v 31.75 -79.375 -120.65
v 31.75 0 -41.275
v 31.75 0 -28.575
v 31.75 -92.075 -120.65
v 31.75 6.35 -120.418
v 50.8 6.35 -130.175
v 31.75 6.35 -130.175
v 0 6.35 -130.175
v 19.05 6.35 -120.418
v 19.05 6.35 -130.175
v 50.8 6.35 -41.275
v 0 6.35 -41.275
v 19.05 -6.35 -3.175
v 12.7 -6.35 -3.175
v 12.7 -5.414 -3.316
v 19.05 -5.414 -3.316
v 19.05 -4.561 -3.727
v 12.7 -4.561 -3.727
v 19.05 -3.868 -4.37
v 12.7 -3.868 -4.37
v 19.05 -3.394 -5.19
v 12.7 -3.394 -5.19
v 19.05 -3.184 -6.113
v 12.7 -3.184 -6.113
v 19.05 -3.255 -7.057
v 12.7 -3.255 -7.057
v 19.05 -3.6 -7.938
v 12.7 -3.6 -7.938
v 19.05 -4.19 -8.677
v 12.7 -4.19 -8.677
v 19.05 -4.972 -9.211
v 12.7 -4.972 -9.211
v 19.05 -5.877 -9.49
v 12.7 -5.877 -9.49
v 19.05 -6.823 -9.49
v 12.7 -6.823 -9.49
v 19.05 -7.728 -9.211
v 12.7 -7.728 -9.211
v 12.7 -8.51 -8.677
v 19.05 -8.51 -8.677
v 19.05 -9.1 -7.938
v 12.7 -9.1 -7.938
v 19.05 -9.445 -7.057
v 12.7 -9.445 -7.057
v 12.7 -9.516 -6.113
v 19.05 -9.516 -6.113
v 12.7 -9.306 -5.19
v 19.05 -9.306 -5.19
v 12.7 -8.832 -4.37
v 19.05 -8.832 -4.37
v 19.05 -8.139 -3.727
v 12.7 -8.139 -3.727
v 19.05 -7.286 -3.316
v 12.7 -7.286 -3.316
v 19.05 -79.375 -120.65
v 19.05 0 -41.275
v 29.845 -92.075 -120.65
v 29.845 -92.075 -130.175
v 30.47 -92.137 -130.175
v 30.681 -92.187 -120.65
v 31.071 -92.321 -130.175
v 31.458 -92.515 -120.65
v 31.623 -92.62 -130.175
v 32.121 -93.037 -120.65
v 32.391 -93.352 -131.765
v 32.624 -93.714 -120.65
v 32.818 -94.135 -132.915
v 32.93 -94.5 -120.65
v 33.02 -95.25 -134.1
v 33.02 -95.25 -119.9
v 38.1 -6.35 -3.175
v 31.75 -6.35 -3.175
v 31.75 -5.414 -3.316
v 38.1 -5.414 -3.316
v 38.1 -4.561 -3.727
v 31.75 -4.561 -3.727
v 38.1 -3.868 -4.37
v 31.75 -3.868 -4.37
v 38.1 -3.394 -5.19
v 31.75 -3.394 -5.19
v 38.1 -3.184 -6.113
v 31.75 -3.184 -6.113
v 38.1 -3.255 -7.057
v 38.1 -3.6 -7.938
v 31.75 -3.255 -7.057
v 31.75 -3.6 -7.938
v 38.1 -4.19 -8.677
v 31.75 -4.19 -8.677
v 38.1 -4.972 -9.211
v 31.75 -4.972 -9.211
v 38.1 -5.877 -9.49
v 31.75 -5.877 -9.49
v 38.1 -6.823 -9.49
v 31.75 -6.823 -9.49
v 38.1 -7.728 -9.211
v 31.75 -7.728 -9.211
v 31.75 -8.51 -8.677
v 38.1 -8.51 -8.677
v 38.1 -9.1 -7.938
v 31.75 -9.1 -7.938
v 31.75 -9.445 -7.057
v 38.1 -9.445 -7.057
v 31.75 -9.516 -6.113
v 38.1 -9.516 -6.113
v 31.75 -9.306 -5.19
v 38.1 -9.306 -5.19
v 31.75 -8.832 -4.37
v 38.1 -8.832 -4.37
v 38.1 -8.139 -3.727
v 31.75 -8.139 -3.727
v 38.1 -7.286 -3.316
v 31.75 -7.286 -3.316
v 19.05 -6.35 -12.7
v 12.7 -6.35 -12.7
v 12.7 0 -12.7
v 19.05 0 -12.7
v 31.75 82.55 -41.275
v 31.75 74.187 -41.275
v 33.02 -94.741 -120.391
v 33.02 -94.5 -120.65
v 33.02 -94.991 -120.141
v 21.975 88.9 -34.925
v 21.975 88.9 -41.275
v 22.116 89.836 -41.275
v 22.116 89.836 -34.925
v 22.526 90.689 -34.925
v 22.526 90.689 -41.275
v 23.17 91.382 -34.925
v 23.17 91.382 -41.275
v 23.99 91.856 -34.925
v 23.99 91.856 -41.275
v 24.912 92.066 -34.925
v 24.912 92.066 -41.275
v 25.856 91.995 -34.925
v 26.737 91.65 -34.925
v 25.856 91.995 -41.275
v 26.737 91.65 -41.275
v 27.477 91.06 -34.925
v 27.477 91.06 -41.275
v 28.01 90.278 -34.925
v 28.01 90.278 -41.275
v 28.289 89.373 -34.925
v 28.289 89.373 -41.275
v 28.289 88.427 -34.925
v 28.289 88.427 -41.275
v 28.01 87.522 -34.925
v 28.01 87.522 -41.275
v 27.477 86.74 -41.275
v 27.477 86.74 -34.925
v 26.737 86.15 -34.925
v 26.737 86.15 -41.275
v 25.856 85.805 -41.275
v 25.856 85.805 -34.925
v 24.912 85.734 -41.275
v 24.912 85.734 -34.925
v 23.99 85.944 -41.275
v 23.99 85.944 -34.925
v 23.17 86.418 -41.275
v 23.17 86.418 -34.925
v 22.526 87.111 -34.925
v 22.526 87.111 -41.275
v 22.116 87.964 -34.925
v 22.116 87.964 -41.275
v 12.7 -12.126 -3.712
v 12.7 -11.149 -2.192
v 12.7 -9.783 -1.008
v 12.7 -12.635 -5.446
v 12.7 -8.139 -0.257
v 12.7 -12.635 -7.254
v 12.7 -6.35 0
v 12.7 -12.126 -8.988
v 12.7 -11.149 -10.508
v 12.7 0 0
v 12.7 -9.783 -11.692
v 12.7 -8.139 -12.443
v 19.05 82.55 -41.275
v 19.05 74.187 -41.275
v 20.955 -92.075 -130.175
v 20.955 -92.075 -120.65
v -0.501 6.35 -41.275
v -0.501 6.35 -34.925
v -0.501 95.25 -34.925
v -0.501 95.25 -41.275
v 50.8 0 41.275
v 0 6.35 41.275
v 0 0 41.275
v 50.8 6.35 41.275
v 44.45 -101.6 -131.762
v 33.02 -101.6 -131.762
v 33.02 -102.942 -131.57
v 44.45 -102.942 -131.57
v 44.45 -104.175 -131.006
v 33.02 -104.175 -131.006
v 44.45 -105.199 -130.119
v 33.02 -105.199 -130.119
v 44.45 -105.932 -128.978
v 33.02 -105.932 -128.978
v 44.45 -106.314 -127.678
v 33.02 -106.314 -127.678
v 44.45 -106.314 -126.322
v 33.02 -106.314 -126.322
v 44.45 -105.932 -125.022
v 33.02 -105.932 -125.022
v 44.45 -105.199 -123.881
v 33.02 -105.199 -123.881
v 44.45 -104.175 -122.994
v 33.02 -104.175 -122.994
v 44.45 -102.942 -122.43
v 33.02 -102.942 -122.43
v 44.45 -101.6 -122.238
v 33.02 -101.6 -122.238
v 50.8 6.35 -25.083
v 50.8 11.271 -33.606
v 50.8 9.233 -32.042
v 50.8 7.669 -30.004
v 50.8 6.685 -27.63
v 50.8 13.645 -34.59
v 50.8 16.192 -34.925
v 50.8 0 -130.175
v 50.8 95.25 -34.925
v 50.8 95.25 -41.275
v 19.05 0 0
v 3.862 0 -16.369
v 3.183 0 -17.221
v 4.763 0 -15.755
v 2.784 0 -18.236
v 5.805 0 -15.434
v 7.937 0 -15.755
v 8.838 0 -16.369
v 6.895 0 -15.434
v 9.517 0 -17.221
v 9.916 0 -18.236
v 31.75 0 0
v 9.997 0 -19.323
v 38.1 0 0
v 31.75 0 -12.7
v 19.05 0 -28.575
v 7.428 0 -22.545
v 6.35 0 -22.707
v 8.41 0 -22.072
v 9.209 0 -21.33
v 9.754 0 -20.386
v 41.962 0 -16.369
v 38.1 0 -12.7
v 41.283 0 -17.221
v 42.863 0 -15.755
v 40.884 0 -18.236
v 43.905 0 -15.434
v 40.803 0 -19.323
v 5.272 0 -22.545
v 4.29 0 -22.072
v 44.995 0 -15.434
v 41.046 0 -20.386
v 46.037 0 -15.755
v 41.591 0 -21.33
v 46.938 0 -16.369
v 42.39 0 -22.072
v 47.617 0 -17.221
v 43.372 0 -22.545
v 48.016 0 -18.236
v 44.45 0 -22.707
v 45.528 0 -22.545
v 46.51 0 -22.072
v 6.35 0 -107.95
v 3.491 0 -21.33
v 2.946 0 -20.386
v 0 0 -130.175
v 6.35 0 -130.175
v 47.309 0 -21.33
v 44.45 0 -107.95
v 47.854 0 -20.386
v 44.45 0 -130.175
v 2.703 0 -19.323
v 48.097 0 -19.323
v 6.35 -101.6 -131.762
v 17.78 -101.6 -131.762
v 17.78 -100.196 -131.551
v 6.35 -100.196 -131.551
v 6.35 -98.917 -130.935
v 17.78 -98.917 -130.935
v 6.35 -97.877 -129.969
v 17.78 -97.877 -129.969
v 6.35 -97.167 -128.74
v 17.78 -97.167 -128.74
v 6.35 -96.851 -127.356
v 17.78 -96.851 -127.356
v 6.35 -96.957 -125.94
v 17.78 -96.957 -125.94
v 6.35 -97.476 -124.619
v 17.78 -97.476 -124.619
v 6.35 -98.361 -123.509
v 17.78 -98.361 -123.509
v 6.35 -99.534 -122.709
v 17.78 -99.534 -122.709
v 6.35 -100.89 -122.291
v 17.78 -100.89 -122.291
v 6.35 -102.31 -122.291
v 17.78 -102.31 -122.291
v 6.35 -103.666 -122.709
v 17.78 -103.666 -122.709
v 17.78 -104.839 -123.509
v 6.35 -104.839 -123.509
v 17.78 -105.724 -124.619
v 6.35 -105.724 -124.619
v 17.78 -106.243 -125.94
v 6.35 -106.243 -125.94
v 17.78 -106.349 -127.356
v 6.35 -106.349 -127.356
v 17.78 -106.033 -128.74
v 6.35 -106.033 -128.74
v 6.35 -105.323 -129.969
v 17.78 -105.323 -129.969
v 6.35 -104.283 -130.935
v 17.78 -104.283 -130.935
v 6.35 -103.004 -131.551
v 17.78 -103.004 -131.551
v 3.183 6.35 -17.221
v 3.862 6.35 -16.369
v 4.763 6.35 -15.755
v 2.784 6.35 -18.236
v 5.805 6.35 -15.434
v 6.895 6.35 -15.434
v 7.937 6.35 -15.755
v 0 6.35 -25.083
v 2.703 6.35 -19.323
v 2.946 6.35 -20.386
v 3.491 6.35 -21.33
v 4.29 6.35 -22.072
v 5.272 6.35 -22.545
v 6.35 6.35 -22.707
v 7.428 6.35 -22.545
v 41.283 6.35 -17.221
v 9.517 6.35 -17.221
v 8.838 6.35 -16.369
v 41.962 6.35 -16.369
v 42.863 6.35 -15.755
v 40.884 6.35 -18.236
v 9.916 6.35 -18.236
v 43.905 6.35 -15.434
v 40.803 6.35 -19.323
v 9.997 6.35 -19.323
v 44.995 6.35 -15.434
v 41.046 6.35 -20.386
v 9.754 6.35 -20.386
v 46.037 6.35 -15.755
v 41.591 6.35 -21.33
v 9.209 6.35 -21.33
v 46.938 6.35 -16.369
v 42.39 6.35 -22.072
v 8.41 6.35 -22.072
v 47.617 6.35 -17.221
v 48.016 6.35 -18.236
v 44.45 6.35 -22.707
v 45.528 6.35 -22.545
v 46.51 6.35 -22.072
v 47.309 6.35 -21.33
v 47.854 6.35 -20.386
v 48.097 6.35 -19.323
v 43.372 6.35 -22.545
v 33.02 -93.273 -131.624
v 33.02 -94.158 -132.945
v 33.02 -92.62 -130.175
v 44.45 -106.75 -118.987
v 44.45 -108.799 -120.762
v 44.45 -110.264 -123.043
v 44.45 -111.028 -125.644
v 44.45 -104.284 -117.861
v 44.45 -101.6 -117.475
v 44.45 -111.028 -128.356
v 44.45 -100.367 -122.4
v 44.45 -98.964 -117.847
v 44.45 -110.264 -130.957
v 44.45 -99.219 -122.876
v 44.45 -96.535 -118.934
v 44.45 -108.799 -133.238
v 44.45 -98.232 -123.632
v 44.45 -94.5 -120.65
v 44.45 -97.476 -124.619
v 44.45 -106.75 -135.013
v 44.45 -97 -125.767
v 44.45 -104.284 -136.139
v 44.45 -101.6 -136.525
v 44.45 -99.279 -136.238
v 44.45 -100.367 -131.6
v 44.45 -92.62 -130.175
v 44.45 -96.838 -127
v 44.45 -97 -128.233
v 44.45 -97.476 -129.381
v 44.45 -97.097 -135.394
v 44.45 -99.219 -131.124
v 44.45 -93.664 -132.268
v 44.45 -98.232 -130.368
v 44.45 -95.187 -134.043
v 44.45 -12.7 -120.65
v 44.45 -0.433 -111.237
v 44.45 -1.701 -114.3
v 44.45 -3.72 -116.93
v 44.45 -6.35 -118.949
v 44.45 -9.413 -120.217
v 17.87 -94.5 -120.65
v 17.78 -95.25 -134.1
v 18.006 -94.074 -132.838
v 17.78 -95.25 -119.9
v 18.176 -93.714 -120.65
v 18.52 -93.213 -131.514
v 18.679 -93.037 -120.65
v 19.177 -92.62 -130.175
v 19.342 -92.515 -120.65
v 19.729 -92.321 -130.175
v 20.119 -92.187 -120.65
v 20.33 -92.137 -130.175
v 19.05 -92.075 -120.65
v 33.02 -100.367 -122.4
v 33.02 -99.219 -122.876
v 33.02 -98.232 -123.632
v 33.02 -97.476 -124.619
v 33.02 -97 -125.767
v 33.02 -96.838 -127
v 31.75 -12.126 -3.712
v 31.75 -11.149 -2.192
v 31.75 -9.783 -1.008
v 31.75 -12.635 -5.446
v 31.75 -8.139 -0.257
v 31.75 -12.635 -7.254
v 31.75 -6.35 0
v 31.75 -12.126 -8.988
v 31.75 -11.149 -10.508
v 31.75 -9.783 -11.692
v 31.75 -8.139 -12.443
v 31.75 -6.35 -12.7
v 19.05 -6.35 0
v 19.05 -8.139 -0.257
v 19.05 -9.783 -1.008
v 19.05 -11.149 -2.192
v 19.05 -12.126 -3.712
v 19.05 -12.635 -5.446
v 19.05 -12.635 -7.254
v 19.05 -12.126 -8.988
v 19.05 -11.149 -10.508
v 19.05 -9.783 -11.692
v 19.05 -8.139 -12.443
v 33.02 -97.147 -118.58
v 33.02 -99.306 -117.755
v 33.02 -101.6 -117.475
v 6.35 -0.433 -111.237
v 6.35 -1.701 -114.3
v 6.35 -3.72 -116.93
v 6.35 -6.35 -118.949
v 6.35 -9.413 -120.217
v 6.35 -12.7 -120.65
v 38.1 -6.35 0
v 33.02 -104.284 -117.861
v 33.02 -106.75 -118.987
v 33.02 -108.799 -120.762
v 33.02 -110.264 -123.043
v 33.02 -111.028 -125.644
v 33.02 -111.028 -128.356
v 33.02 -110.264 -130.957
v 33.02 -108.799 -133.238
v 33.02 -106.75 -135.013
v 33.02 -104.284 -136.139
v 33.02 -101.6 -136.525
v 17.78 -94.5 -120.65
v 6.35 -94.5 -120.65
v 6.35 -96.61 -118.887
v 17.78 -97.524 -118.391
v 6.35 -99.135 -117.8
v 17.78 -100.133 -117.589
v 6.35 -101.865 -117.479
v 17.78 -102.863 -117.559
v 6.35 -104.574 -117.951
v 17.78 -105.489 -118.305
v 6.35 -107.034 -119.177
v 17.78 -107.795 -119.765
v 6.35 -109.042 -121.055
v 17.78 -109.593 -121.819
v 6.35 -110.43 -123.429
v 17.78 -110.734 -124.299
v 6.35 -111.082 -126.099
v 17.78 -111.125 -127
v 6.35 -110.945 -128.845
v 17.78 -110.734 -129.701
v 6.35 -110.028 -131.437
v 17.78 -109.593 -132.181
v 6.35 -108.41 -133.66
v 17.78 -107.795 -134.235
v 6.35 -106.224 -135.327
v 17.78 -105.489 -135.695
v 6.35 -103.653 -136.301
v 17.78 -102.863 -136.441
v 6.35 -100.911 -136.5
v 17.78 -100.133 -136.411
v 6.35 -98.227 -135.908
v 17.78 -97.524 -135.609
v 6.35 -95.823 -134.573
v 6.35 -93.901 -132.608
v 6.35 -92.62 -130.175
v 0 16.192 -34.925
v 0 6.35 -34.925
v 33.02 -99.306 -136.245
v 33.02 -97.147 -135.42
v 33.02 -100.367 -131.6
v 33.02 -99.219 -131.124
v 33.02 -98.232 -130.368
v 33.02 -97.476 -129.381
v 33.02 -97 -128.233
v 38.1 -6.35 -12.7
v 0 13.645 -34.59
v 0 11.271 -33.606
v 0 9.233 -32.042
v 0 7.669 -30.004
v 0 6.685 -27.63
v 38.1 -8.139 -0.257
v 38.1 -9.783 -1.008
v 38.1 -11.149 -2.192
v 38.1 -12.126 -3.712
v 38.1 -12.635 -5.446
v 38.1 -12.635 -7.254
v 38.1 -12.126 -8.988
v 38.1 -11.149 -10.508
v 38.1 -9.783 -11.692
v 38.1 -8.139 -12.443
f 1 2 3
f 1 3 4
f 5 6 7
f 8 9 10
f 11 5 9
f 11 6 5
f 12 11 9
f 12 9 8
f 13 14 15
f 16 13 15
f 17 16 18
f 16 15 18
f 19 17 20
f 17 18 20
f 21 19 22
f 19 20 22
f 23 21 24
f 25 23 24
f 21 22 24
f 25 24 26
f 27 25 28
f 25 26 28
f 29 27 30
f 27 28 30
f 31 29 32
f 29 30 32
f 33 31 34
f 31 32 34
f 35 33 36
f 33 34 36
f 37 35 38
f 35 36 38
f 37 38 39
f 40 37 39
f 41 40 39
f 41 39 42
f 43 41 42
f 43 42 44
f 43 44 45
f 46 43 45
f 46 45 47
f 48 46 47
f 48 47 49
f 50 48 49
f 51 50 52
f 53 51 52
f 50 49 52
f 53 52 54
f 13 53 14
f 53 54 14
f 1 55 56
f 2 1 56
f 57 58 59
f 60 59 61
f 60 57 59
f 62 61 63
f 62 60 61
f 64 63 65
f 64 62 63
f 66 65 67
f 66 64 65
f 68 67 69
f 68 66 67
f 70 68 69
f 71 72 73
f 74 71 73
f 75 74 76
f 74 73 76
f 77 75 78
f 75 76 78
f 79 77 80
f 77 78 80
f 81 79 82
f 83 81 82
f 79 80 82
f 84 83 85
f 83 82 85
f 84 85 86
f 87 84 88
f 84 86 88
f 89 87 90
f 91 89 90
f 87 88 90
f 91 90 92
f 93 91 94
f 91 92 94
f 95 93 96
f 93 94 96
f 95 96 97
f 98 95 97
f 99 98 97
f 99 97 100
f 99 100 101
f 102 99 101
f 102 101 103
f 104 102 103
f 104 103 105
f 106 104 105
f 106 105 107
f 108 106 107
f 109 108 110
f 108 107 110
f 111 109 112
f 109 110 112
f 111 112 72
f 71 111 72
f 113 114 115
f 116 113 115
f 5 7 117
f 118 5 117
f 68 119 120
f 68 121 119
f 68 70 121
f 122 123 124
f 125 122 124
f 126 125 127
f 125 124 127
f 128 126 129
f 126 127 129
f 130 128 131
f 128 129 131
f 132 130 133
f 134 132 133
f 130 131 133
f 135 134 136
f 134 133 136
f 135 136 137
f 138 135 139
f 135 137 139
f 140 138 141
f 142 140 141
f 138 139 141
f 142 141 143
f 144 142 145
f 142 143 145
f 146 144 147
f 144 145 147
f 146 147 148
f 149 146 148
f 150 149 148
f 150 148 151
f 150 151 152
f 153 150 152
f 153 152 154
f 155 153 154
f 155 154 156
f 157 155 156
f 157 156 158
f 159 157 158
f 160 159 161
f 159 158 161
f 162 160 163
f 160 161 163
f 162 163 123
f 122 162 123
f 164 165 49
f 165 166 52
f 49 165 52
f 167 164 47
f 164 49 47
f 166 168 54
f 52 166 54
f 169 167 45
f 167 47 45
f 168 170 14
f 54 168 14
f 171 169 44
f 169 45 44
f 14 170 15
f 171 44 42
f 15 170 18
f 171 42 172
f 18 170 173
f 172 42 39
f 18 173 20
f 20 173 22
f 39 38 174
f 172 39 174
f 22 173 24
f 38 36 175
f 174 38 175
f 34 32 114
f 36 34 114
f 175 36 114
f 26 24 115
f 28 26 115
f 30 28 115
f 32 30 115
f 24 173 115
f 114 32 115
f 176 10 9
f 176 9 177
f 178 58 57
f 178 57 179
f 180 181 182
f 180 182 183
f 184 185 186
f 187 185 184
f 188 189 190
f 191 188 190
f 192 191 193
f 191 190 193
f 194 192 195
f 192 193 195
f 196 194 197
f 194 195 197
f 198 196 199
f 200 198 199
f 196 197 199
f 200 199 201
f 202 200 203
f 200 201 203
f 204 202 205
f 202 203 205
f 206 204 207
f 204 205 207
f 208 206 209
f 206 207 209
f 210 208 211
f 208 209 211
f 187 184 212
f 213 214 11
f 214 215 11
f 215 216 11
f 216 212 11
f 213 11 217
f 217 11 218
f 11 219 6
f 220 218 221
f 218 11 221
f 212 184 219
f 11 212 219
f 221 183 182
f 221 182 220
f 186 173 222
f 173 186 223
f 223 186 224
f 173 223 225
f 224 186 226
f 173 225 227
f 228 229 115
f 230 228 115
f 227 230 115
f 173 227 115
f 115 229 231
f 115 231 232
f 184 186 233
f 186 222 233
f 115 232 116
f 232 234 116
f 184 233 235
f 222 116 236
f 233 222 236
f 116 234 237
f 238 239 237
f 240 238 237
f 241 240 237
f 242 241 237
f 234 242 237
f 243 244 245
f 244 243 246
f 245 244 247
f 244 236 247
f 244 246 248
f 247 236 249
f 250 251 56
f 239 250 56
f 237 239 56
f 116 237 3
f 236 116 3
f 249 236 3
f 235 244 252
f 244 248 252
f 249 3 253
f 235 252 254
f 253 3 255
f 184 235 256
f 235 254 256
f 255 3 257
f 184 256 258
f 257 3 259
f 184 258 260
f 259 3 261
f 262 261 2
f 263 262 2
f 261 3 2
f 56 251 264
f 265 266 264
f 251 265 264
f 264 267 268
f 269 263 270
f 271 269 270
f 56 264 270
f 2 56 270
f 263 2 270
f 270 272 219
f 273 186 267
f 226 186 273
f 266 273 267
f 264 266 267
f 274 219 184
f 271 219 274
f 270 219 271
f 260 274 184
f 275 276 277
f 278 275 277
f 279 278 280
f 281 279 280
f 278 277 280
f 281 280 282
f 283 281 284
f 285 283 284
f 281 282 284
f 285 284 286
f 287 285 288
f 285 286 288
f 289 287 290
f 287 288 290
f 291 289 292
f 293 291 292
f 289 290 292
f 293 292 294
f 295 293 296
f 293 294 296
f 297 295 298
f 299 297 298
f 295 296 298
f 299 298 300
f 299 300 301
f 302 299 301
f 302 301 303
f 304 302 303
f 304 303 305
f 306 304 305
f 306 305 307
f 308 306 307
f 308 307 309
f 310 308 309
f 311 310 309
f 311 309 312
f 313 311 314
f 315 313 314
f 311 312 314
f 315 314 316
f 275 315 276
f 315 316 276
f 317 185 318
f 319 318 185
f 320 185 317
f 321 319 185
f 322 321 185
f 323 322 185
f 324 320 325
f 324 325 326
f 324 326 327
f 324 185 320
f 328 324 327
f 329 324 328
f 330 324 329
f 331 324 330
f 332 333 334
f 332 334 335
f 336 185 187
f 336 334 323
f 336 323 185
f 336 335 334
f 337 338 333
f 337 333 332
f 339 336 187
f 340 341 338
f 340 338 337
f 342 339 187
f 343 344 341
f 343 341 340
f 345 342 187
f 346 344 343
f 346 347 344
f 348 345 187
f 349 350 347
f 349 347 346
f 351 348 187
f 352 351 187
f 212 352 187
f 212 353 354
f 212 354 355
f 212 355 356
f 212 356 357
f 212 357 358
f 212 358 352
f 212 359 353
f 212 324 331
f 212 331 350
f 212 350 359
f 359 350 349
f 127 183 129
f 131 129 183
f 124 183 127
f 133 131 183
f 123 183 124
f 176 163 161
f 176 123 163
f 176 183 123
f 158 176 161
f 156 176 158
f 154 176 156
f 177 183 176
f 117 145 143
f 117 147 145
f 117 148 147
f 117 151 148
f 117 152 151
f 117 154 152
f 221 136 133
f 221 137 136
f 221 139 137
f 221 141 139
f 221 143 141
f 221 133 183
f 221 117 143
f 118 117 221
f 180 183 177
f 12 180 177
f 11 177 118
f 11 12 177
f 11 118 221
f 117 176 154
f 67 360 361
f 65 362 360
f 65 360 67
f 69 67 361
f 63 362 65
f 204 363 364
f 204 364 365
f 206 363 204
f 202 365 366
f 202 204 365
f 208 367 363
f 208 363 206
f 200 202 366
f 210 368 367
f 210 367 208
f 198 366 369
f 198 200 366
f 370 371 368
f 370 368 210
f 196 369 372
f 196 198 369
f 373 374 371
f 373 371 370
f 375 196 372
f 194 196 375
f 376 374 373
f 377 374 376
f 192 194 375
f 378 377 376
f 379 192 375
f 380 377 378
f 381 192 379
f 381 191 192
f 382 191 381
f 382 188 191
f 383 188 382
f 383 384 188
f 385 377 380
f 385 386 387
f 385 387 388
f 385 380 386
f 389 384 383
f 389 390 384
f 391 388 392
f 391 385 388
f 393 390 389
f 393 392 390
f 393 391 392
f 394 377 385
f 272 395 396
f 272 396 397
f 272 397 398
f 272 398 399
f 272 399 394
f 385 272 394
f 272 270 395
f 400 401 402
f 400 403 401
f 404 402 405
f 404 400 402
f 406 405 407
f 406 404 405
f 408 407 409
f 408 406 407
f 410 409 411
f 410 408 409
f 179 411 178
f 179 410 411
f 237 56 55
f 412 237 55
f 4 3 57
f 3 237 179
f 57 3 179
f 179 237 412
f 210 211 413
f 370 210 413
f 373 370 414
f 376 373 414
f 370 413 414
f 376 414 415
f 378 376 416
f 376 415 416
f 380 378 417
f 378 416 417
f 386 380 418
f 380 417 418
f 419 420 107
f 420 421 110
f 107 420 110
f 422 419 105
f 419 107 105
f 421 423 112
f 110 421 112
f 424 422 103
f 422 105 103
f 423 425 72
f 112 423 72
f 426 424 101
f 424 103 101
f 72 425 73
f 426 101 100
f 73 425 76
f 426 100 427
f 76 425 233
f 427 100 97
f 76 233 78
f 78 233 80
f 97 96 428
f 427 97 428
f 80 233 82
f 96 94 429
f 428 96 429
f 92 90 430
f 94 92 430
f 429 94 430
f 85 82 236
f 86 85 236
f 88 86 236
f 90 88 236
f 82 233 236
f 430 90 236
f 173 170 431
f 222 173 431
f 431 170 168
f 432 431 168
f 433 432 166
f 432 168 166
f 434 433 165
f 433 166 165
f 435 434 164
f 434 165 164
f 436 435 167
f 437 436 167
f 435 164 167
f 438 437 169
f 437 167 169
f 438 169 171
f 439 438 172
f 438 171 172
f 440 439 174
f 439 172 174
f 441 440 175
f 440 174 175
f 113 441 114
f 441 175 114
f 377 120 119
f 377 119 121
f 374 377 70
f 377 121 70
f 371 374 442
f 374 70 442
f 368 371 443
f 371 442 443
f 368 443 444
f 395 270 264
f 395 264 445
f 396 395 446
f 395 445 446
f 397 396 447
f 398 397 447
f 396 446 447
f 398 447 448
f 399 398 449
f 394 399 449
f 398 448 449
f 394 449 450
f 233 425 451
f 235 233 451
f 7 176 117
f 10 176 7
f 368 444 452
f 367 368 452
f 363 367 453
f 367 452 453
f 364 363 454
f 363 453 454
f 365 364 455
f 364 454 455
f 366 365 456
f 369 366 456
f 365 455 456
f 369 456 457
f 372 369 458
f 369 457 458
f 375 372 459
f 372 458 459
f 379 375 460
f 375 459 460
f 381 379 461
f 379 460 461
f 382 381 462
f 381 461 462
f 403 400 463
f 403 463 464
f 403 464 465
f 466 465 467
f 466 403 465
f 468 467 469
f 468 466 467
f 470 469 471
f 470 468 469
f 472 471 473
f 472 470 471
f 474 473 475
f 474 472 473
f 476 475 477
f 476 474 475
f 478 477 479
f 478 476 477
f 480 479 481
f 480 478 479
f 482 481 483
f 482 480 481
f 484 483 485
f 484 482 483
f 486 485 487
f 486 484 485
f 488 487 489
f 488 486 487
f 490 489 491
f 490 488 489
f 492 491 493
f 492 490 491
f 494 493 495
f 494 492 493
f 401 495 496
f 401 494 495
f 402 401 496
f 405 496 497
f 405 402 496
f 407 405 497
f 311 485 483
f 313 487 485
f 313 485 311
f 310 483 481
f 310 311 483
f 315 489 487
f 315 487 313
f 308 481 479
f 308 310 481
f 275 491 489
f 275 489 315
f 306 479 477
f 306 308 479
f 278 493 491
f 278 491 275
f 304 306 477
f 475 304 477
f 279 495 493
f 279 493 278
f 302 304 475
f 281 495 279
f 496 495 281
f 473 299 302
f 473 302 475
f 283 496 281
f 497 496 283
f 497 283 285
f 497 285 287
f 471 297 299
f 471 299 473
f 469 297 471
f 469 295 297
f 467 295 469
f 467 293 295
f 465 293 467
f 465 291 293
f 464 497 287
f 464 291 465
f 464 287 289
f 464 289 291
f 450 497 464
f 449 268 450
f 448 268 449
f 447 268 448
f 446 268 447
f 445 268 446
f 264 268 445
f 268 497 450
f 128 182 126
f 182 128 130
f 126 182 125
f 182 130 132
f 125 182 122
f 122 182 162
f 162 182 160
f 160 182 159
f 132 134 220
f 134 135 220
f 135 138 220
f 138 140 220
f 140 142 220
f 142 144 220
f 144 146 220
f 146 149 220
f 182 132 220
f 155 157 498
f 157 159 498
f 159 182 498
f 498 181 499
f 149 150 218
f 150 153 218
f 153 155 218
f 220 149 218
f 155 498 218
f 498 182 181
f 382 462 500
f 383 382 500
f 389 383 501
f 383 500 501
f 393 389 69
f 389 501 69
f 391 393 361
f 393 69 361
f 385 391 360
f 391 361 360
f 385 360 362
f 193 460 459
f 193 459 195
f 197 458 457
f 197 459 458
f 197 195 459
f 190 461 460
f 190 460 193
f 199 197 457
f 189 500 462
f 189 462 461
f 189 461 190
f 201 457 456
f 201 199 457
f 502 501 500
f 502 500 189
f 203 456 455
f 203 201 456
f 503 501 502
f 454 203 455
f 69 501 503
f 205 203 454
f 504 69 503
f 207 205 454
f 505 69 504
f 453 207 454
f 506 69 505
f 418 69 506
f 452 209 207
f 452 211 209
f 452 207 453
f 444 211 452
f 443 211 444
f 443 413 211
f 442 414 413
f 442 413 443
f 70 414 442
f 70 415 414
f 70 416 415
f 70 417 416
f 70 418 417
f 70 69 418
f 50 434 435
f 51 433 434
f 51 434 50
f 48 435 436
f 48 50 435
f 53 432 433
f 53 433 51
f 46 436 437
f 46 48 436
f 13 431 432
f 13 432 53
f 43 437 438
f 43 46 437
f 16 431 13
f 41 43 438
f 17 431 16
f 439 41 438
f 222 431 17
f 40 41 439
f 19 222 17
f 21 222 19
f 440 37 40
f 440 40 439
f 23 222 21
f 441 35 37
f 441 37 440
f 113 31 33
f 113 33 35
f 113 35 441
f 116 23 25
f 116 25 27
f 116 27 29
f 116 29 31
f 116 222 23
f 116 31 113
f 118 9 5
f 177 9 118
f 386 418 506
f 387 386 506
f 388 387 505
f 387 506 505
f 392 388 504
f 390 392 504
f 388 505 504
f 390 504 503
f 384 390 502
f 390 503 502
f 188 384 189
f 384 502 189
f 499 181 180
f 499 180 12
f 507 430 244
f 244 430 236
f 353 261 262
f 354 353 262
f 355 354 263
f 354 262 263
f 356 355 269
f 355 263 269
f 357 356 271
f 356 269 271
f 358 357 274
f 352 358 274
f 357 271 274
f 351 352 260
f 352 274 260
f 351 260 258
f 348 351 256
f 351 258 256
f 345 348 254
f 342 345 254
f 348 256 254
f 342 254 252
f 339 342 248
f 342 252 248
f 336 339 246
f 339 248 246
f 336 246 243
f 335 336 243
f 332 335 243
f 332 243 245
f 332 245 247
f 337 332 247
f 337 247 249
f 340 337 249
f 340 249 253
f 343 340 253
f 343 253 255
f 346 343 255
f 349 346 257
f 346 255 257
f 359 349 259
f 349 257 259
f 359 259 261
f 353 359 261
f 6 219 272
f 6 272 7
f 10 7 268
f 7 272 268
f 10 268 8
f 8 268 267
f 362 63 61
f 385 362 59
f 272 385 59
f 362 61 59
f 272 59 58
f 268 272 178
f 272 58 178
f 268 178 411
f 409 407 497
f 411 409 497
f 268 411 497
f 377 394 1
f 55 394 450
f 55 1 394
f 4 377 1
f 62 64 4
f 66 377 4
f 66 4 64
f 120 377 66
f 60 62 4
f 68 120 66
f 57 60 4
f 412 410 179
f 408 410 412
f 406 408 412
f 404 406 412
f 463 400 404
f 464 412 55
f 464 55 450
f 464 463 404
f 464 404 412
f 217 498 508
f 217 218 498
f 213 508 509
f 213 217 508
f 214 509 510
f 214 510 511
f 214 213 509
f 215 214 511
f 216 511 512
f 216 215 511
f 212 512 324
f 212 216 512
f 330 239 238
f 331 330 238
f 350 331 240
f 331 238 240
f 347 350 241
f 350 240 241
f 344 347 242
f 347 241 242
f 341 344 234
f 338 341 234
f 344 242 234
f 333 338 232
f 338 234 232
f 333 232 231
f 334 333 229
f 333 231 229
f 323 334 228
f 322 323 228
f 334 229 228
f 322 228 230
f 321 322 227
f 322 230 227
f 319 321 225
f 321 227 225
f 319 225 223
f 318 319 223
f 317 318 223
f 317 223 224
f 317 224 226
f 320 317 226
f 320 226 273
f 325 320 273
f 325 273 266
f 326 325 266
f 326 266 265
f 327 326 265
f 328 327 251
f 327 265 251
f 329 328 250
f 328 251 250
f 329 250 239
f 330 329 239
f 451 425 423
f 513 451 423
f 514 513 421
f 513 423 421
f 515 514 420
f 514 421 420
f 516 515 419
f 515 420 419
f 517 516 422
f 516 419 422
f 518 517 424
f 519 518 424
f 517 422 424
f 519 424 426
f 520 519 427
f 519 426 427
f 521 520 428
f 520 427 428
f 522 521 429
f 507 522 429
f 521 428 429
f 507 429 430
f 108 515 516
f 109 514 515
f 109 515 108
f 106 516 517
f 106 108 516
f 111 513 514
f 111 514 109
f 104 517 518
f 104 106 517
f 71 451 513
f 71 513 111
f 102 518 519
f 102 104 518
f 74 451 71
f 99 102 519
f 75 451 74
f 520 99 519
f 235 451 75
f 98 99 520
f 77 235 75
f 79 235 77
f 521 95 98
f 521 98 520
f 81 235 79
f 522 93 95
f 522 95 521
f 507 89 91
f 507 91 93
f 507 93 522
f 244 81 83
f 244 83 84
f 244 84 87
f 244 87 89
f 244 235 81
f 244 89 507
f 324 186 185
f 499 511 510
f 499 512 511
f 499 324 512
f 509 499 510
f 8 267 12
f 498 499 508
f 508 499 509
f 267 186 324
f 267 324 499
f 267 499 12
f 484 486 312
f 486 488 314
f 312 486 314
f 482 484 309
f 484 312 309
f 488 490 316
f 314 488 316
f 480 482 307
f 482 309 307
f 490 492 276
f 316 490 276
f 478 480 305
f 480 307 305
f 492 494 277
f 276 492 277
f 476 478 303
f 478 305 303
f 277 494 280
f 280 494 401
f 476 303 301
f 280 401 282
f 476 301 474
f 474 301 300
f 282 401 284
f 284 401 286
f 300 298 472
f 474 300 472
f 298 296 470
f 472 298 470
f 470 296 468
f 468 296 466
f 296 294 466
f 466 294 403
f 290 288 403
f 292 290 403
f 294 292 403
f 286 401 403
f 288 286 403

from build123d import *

# Parameters (mm, degrees)
SKETCH2_W                 = 50.8
SKETCH2_H                 = 92.075
BOSS_EXTRUDE1_DEPTH       = 6.35
SKETCH3_W                 = 51.30062604
SKETCH3_H                 = 6.35
BOSS_EXTRUDE2_DEPTH       = 88.9
FILLET1_R                 = 9.8425
SKETCH4_W                 = 50.8
SKETCH4_H                 = 6.35
BOSS_EXTRUDE3_DEPTH       = 38.1
SKETCH7_W                 = 19.05
SKETCH7_H                 = 9.525
BOSS_EXTRUDE4_DEPTH       = 92.075
BOSS_EXTRUDE7_START       = -7.62
SKETCH5_R                 = 9.525
SKETCH5_R_2               = 4.7625
BOSS_EXTRUDE7_DEPTH       = 11.43
BOSS_EXTRUDE8_START       = 7.62
BOSS_EXTRUDE8_DEPTH       = 11.43
SKETCH11_W                = 11.43
SKETCH11_H                = 9.525
BOSS_EXTRUDE9_DEPTH       = 2.425484171
BOSS_EXTRUDE10_DEPTH      = 6.35
BOSS_EXTRUDE10_DEPTH_BACK = 6.35
BOSS_EXTRUDE11_START      = 6.35
BOSS_EXTRUDE11_DEPTH      = 6.35
BOSS_EXTRUDE12_START      = -12.7
BOSS_EXTRUDE12_DEPTH      = 6.35
BOSS_EXTRUDE13_START      = -34.925
SKETCH18_W                = 50.8
SKETCH18_H                = 6.35
BOSS_EXTRUDE13_DEPTH      = 76.2
SKETCH17_R                = 3.657298314
CUT_EXTRUDE4_DEPTH        = 6.35
CUT_EXTRUDE5_DEPTH        = 6.35
BOSS_EXTRUDE14_DEPTH      = 6.35
BOSS_EXTRUDE14_DEPTH_BACK = 6.35
FILLET2_R                 = 12.7
FILLET3_R                 = 3.175


with BuildPart() as part:
    # Sketch2 → Boss-Extrude1 (new body)
    with BuildSketch(Plane(origin=(0, 0, 0), x_dir=(1, 0, 0), z_dir=(0, 1, 0))):
        with Locations((25.4, 46.0375)):
            Rectangle(SKETCH2_W, SKETCH2_H)
    extrude(amount=BOSS_EXTRUDE1_DEPTH)

    # Sketch3 → Boss-Extrude2 (add)
    with BuildSketch(Plane(origin=(0, 6.35, 0), x_dir=(1, 0, 0), z_dir=(0, 1, 0))):
        with Locations((25.14968698, 38.1)):
            Rectangle(SKETCH3_W, SKETCH3_H)
    extrude(amount=BOSS_EXTRUDE2_DEPTH)

    # Fillet1
    fillet1_edges = [part.edges().sort_by_distance(p)[0] for p in [
        (25.4, 6.35, -34.925),
    ]]
    fillet(fillet1_edges, radius=FILLET1_R)

    # Sketch4 → Boss-Extrude3 (add)
    with BuildSketch(Plane(origin=(0, 0, -92.075), x_dir=(-1, 0, 0), z_dir=(0, 0, -1))):
        with Locations((-25.4, 3.175)):
            Rectangle(SKETCH4_W, SKETCH4_H)
    extrude(amount=BOSS_EXTRUDE3_DEPTH)

    # Sketch7 → Boss-Extrude4 (add)
    with BuildSketch(Plane(origin=(0, 0, 0), x_dir=(-1, 0, 0), z_dir=(0, -1, 0))):
        with Locations((-15.875, 125.4125)):
            Rectangle(SKETCH7_W, SKETCH7_H)
        with Locations((-34.925, 125.4125)):
            Rectangle(SKETCH7_W, SKETCH7_H)
    extrude(amount=BOSS_EXTRUDE4_DEPTH)



with BuildPart() as body_2:
    # Sketch5 → Boss-Extrude7 (new body)
    with BuildSketch(Plane(origin=(25.4, 0, 0), x_dir=(0, 0, -1), z_dir=(1, 0, 0)).offset(BOSS_EXTRUDE7_START)):
        with Locations((127, -101.6)):
            Circle(SKETCH5_R)
        with Locations((127, -101.6)):
            Circle(SKETCH5_R_2, mode=Mode.SUBTRACT)
    extrude(amount=-BOSS_EXTRUDE7_DEPTH)


with BuildPart() as body_3:
    # Sketch5<6> → Boss-Extrude8 (new body)
    with BuildSketch(Plane(origin=(25.4, 0, 0), x_dir=(0, 0, -1), z_dir=(1, 0, 0)).offset(BOSS_EXTRUDE8_START)):
        with BuildLine():
            ThreePointArc((127, -92.075), (120.264807909, -94.864807909), (117.475, -101.6))
            Line((117.475, -101.6), (122.2375, -101.6))
            ThreePointArc((122.2375, -101.6), (123.632403955, -98.232403955), (127, -96.8375))
            Line((127, -96.8375), (127, -92.075))
        make_face()
        with BuildLine():
            Line((122.2375, -101.6), (117.475, -101.6))
            ThreePointArc((117.475, -101.6), (127, -111.125), (136.525, -101.6))
            ThreePointArc((136.525, -101.6), (133.735192091, -94.864807909), (127, -92.075))
            Line((127, -92.075), (127, -96.8375))
            ThreePointArc((127, -96.8375), (130.367596045, -98.232403955), (131.7625, -101.6))
            ThreePointArc((131.7625, -101.6), (127, -106.3625), (122.2375, -101.6))
        make_face()
    extrude(amount=BOSS_EXTRUDE8_DEPTH)


with BuildPart() as part_1:
    add(part.part)

    add(body_2.part)  # Boss-Extrude9 merges body 2

    add(body_3.part)  # Boss-Extrude9 merges body 3
    # Sketch11 → Boss-Extrude9 (add)
    with BuildSketch(Plane.XZ.offset(92.075)):
        with Locations((12.065, -125.4125)):
            Rectangle(SKETCH11_W, SKETCH11_H)
        with Locations((38.735, -125.4125)):
            Rectangle(SKETCH11_W, SKETCH11_H)
    extrude(amount=BOSS_EXTRUDE9_DEPTH)

    # Sketch13 → Boss-Extrude10 (add, two sides: drawn at the far end of the back side and taken through both)
    with BuildSketch(Plane(origin=(25.4, 0, 0), x_dir=(0, 0, -1), z_dir=(1, 0, 0)).offset(-BOSS_EXTRUDE10_DEPTH_BACK)):
        Polygon((120.65, -79.375), (41.275, 0), (28.575, 0), (120.65, -92.075), align=None)
    extrude(amount=BOSS_EXTRUDE10_DEPTH + BOSS_EXTRUDE10_DEPTH_BACK)

    # Sketch15 → Boss-Extrude11 (add)
    with BuildSketch(Plane(origin=(25.4, 0, 0), x_dir=(0, 0, -1), z_dir=(1, 0, 0)).offset(BOSS_EXTRUDE11_START)):
        with BuildLine():
            ThreePointArc((12.7, -6.35), (10.840128061, -1.859871939), (6.35, 0))
            ThreePointArc((6.35, 0), (1.859871939, -1.859871939), (0, -6.35))
            Line((0, -6.35), (3.175, -6.35))
            ThreePointArc((3.175, -6.35), (6.35, -3.175), (9.525, -6.35))
            Line((9.525, -6.35), (12.7, -6.35))
        make_face()
        with BuildLine():
            Line((3.175, -6.35), (0, -6.35))
            ThreePointArc((0, -6.35), (6.35, -12.7), (12.7, -6.35))
            Line((12.7, -6.35), (9.525, -6.35))
            ThreePointArc((9.525, -6.35), (6.35, -9.525), (3.175, -6.35))
        make_face()
        with BuildLine():
            Line((6.35, 0), (0, 0))
            Line((0, 0), (0, -6.35))
            ThreePointArc((0, -6.35), (1.859871939, -1.859871939), (6.35, 0))
        make_face()
        with BuildLine():
            Line((12.7, 0), (6.35, 0))
            ThreePointArc((6.35, 0), (10.840128061, -1.859871939), (12.7, -6.35))
            Line((12.7, -6.35), (12.7, 0))
        make_face()
    extrude(amount=BOSS_EXTRUDE11_DEPTH)

    # Sketch15<3> → Boss-Extrude12 (add)
    with BuildSketch(Plane(origin=(25.4, 0, 0), x_dir=(0, 0, -1), z_dir=(1, 0, 0)).offset(BOSS_EXTRUDE12_START)):
        with BuildLine():
            ThreePointArc((12.7, -6.35), (10.840128061, -1.859871939), (6.35, 0))
            ThreePointArc((6.35, 0), (1.859871939, -1.859871939), (0, -6.35))
            Line((0, -6.35), (3.175, -6.35))
            ThreePointArc((3.175, -6.35), (6.35, -3.175), (9.525, -6.35))
            Line((9.525, -6.35), (12.7, -6.35))
        make_face()
        with BuildLine():
            Line((3.175, -6.35), (0, -6.35))
            ThreePointArc((0, -6.35), (6.35, -12.7), (12.7, -6.35))
            Line((12.7, -6.35), (9.525, -6.35))
            ThreePointArc((9.525, -6.35), (6.35, -9.525), (3.175, -6.35))
        make_face()
        with BuildLine():
            Line((6.35, 0), (0, 0))
            Line((0, 0), (0, -6.35))
            ThreePointArc((0, -6.35), (1.859871939, -1.859871939), (6.35, 0))
        make_face()
        with BuildLine():
            Line((12.7, 0), (6.35, 0))
            ThreePointArc((6.35, 0), (10.840128061, -1.859871939), (12.7, -6.35))
            Line((12.7, -6.35), (12.7, 0))
        make_face()
    extrude(amount=BOSS_EXTRUDE12_DEPTH)

    # Sketch18 → Boss-Extrude13 (add)
    with BuildSketch(Plane.XY.offset(BOSS_EXTRUDE13_START)):
        with Locations((25.4, 3.175)):
            Rectangle(SKETCH18_W, SKETCH18_H)
    extrude(amount=BOSS_EXTRUDE13_DEPTH)

    # Sketch17 → Cut-Extrude4 (cut)
    with BuildSketch(Plane(origin=(0, 0, 0), x_dir=(-1, 0, 0), z_dir=(0, -1, 0))):
        with Locations(Location((-44.45, 19.05, 0), (0, 0, 90))):
            Circle(SKETCH17_R)
        with Locations(Location((-6.35, 19.05, 0), (0, 0, 90))):
            Circle(SKETCH17_R)
    extrude(amount=-CUT_EXTRUDE4_DEPTH, mode=Mode.SUBTRACT)

    # Sketch19 → Cut-Extrude5 (cut)
    with BuildSketch(Plane(origin=(0, 0, -41.275), x_dir=(-1, 0, 0), z_dir=(0, 0, -1))):
        with BuildLine():
            ThreePointArc((-28.32468698, 88.9), (-25.14968698, 85.725), (-21.97468698, 88.9))
            Line((-21.97468698, 88.9), (-28.32468698, 88.9))
        make_face()
        with BuildLine():
            Line((-28.32468698, 88.9), (-21.97468698, 88.9))
            ThreePointArc((-21.97468698, 88.9), (-25.14968698, 92.075), (-28.32468698, 88.9))
        make_face()
    extrude(amount=-CUT_EXTRUDE5_DEPTH, mode=Mode.SUBTRACT)

    # Sketch20 → Boss-Extrude14 (add, two sides: drawn at the far end of the back side and taken through both)
    with BuildSketch(Plane(origin=(25.4, 0, 0), x_dir=(0, 0, -1), z_dir=(1, 0, 0)).offset(-BOSS_EXTRUDE14_DEPTH_BACK)):
        Polygon((41.275, 82.55), (130.175, 6.35), (120.417648783, 6.35), (41.275, 74.186556099), align=None)
    extrude(amount=BOSS_EXTRUDE14_DEPTH + BOSS_EXTRUDE14_DEPTH_BACK)

    # Fillet2
    fillet2_edges = [part_1.edges().sort_by_distance(p)[0] for p in [
        (25.4, 0, -120.65),
    ]]
    fillet(fillet2_edges, radius=FILLET2_R)

    # Fillet3
    # the kernel refuses this fillet: 3.175 mm, written as the material it adds along each edge
    with BuildSketch(Plane(origin=(33.02, -92.075, -120.65), x_dir=(-1, 0, 0), z_dir=(0, 0, -1))) as fillet3_piece_1:
        with BuildLine():
            CenterArc((FILLET3_R, -FILLET3_R), FILLET3_R, 90, 90)
            Line((0, -FILLET3_R), (0, 0))
            Line((0, 0), (FILLET3_R, 0))
        make_face()
    extrude(amount=9.525)
    with BuildSketch(Plane(origin=(33.02, -92.075, -112.7125), x_dir=(-1, 0, 0), z_dir=(0, 0, -1))) as fillet3_piece_2_section:
        with BuildLine():
            CenterArc((FILLET3_R, -FILLET3_R), FILLET3_R, 90, 90)
            Line((0, -FILLET3_R), (0, 0))
            Line((0, 0), (FILLET3_R, 0))
        make_face()
    fillet3_piece_2 = extrude(amount=25.4, mode=Mode.PRIVATE)
    fillet3_piece_2 = fillet3_piece_2 & Plane(origin=(33.001906898, -101.6, -127), x_dir=(0, 1, 0), z_dir=(-1, 0, 0)) * Cylinder(9.525, 64, mode=Mode.PRIVATE)
    add(fillet3_piece_2)
    with BuildSketch(Plane(origin=(17.78, -92.075, -120.65), x_dir=(1, 0, 0), z_dir=(0, 0, -1))) as fillet3_piece_3:
        with BuildLine():
            CenterArc((FILLET3_R, FILLET3_R), FILLET3_R, 180, 90)
            Line((0, FILLET3_R), (0, 0))
            Line((0, 0), (FILLET3_R, 0))
        make_face()
    extrude(amount=9.525)
    with BuildSketch(Plane(origin=(17.78, -92.075, -112.7125), x_dir=(1, 0, 0), z_dir=(0, 0, -1))) as fillet3_piece_4_section:
        with BuildLine():
            CenterArc((FILLET3_R, FILLET3_R), FILLET3_R, 180, 90)
            Line((0, FILLET3_R), (0, 0))
            Line((0, 0), (FILLET3_R, 0))
        make_face()
    fillet3_piece_4 = extrude(amount=25.4, mode=Mode.PRIVATE)
    fillet3_piece_4 = fillet3_piece_4 & Plane(origin=(17.798093102, -101.6, -127), x_dir=(0, 0, -1), z_dir=(1, 0, 0)) * Cylinder(9.525, 64, mode=Mode.PRIVATE)
    add(fillet3_piece_4)


solid = part_1.part
